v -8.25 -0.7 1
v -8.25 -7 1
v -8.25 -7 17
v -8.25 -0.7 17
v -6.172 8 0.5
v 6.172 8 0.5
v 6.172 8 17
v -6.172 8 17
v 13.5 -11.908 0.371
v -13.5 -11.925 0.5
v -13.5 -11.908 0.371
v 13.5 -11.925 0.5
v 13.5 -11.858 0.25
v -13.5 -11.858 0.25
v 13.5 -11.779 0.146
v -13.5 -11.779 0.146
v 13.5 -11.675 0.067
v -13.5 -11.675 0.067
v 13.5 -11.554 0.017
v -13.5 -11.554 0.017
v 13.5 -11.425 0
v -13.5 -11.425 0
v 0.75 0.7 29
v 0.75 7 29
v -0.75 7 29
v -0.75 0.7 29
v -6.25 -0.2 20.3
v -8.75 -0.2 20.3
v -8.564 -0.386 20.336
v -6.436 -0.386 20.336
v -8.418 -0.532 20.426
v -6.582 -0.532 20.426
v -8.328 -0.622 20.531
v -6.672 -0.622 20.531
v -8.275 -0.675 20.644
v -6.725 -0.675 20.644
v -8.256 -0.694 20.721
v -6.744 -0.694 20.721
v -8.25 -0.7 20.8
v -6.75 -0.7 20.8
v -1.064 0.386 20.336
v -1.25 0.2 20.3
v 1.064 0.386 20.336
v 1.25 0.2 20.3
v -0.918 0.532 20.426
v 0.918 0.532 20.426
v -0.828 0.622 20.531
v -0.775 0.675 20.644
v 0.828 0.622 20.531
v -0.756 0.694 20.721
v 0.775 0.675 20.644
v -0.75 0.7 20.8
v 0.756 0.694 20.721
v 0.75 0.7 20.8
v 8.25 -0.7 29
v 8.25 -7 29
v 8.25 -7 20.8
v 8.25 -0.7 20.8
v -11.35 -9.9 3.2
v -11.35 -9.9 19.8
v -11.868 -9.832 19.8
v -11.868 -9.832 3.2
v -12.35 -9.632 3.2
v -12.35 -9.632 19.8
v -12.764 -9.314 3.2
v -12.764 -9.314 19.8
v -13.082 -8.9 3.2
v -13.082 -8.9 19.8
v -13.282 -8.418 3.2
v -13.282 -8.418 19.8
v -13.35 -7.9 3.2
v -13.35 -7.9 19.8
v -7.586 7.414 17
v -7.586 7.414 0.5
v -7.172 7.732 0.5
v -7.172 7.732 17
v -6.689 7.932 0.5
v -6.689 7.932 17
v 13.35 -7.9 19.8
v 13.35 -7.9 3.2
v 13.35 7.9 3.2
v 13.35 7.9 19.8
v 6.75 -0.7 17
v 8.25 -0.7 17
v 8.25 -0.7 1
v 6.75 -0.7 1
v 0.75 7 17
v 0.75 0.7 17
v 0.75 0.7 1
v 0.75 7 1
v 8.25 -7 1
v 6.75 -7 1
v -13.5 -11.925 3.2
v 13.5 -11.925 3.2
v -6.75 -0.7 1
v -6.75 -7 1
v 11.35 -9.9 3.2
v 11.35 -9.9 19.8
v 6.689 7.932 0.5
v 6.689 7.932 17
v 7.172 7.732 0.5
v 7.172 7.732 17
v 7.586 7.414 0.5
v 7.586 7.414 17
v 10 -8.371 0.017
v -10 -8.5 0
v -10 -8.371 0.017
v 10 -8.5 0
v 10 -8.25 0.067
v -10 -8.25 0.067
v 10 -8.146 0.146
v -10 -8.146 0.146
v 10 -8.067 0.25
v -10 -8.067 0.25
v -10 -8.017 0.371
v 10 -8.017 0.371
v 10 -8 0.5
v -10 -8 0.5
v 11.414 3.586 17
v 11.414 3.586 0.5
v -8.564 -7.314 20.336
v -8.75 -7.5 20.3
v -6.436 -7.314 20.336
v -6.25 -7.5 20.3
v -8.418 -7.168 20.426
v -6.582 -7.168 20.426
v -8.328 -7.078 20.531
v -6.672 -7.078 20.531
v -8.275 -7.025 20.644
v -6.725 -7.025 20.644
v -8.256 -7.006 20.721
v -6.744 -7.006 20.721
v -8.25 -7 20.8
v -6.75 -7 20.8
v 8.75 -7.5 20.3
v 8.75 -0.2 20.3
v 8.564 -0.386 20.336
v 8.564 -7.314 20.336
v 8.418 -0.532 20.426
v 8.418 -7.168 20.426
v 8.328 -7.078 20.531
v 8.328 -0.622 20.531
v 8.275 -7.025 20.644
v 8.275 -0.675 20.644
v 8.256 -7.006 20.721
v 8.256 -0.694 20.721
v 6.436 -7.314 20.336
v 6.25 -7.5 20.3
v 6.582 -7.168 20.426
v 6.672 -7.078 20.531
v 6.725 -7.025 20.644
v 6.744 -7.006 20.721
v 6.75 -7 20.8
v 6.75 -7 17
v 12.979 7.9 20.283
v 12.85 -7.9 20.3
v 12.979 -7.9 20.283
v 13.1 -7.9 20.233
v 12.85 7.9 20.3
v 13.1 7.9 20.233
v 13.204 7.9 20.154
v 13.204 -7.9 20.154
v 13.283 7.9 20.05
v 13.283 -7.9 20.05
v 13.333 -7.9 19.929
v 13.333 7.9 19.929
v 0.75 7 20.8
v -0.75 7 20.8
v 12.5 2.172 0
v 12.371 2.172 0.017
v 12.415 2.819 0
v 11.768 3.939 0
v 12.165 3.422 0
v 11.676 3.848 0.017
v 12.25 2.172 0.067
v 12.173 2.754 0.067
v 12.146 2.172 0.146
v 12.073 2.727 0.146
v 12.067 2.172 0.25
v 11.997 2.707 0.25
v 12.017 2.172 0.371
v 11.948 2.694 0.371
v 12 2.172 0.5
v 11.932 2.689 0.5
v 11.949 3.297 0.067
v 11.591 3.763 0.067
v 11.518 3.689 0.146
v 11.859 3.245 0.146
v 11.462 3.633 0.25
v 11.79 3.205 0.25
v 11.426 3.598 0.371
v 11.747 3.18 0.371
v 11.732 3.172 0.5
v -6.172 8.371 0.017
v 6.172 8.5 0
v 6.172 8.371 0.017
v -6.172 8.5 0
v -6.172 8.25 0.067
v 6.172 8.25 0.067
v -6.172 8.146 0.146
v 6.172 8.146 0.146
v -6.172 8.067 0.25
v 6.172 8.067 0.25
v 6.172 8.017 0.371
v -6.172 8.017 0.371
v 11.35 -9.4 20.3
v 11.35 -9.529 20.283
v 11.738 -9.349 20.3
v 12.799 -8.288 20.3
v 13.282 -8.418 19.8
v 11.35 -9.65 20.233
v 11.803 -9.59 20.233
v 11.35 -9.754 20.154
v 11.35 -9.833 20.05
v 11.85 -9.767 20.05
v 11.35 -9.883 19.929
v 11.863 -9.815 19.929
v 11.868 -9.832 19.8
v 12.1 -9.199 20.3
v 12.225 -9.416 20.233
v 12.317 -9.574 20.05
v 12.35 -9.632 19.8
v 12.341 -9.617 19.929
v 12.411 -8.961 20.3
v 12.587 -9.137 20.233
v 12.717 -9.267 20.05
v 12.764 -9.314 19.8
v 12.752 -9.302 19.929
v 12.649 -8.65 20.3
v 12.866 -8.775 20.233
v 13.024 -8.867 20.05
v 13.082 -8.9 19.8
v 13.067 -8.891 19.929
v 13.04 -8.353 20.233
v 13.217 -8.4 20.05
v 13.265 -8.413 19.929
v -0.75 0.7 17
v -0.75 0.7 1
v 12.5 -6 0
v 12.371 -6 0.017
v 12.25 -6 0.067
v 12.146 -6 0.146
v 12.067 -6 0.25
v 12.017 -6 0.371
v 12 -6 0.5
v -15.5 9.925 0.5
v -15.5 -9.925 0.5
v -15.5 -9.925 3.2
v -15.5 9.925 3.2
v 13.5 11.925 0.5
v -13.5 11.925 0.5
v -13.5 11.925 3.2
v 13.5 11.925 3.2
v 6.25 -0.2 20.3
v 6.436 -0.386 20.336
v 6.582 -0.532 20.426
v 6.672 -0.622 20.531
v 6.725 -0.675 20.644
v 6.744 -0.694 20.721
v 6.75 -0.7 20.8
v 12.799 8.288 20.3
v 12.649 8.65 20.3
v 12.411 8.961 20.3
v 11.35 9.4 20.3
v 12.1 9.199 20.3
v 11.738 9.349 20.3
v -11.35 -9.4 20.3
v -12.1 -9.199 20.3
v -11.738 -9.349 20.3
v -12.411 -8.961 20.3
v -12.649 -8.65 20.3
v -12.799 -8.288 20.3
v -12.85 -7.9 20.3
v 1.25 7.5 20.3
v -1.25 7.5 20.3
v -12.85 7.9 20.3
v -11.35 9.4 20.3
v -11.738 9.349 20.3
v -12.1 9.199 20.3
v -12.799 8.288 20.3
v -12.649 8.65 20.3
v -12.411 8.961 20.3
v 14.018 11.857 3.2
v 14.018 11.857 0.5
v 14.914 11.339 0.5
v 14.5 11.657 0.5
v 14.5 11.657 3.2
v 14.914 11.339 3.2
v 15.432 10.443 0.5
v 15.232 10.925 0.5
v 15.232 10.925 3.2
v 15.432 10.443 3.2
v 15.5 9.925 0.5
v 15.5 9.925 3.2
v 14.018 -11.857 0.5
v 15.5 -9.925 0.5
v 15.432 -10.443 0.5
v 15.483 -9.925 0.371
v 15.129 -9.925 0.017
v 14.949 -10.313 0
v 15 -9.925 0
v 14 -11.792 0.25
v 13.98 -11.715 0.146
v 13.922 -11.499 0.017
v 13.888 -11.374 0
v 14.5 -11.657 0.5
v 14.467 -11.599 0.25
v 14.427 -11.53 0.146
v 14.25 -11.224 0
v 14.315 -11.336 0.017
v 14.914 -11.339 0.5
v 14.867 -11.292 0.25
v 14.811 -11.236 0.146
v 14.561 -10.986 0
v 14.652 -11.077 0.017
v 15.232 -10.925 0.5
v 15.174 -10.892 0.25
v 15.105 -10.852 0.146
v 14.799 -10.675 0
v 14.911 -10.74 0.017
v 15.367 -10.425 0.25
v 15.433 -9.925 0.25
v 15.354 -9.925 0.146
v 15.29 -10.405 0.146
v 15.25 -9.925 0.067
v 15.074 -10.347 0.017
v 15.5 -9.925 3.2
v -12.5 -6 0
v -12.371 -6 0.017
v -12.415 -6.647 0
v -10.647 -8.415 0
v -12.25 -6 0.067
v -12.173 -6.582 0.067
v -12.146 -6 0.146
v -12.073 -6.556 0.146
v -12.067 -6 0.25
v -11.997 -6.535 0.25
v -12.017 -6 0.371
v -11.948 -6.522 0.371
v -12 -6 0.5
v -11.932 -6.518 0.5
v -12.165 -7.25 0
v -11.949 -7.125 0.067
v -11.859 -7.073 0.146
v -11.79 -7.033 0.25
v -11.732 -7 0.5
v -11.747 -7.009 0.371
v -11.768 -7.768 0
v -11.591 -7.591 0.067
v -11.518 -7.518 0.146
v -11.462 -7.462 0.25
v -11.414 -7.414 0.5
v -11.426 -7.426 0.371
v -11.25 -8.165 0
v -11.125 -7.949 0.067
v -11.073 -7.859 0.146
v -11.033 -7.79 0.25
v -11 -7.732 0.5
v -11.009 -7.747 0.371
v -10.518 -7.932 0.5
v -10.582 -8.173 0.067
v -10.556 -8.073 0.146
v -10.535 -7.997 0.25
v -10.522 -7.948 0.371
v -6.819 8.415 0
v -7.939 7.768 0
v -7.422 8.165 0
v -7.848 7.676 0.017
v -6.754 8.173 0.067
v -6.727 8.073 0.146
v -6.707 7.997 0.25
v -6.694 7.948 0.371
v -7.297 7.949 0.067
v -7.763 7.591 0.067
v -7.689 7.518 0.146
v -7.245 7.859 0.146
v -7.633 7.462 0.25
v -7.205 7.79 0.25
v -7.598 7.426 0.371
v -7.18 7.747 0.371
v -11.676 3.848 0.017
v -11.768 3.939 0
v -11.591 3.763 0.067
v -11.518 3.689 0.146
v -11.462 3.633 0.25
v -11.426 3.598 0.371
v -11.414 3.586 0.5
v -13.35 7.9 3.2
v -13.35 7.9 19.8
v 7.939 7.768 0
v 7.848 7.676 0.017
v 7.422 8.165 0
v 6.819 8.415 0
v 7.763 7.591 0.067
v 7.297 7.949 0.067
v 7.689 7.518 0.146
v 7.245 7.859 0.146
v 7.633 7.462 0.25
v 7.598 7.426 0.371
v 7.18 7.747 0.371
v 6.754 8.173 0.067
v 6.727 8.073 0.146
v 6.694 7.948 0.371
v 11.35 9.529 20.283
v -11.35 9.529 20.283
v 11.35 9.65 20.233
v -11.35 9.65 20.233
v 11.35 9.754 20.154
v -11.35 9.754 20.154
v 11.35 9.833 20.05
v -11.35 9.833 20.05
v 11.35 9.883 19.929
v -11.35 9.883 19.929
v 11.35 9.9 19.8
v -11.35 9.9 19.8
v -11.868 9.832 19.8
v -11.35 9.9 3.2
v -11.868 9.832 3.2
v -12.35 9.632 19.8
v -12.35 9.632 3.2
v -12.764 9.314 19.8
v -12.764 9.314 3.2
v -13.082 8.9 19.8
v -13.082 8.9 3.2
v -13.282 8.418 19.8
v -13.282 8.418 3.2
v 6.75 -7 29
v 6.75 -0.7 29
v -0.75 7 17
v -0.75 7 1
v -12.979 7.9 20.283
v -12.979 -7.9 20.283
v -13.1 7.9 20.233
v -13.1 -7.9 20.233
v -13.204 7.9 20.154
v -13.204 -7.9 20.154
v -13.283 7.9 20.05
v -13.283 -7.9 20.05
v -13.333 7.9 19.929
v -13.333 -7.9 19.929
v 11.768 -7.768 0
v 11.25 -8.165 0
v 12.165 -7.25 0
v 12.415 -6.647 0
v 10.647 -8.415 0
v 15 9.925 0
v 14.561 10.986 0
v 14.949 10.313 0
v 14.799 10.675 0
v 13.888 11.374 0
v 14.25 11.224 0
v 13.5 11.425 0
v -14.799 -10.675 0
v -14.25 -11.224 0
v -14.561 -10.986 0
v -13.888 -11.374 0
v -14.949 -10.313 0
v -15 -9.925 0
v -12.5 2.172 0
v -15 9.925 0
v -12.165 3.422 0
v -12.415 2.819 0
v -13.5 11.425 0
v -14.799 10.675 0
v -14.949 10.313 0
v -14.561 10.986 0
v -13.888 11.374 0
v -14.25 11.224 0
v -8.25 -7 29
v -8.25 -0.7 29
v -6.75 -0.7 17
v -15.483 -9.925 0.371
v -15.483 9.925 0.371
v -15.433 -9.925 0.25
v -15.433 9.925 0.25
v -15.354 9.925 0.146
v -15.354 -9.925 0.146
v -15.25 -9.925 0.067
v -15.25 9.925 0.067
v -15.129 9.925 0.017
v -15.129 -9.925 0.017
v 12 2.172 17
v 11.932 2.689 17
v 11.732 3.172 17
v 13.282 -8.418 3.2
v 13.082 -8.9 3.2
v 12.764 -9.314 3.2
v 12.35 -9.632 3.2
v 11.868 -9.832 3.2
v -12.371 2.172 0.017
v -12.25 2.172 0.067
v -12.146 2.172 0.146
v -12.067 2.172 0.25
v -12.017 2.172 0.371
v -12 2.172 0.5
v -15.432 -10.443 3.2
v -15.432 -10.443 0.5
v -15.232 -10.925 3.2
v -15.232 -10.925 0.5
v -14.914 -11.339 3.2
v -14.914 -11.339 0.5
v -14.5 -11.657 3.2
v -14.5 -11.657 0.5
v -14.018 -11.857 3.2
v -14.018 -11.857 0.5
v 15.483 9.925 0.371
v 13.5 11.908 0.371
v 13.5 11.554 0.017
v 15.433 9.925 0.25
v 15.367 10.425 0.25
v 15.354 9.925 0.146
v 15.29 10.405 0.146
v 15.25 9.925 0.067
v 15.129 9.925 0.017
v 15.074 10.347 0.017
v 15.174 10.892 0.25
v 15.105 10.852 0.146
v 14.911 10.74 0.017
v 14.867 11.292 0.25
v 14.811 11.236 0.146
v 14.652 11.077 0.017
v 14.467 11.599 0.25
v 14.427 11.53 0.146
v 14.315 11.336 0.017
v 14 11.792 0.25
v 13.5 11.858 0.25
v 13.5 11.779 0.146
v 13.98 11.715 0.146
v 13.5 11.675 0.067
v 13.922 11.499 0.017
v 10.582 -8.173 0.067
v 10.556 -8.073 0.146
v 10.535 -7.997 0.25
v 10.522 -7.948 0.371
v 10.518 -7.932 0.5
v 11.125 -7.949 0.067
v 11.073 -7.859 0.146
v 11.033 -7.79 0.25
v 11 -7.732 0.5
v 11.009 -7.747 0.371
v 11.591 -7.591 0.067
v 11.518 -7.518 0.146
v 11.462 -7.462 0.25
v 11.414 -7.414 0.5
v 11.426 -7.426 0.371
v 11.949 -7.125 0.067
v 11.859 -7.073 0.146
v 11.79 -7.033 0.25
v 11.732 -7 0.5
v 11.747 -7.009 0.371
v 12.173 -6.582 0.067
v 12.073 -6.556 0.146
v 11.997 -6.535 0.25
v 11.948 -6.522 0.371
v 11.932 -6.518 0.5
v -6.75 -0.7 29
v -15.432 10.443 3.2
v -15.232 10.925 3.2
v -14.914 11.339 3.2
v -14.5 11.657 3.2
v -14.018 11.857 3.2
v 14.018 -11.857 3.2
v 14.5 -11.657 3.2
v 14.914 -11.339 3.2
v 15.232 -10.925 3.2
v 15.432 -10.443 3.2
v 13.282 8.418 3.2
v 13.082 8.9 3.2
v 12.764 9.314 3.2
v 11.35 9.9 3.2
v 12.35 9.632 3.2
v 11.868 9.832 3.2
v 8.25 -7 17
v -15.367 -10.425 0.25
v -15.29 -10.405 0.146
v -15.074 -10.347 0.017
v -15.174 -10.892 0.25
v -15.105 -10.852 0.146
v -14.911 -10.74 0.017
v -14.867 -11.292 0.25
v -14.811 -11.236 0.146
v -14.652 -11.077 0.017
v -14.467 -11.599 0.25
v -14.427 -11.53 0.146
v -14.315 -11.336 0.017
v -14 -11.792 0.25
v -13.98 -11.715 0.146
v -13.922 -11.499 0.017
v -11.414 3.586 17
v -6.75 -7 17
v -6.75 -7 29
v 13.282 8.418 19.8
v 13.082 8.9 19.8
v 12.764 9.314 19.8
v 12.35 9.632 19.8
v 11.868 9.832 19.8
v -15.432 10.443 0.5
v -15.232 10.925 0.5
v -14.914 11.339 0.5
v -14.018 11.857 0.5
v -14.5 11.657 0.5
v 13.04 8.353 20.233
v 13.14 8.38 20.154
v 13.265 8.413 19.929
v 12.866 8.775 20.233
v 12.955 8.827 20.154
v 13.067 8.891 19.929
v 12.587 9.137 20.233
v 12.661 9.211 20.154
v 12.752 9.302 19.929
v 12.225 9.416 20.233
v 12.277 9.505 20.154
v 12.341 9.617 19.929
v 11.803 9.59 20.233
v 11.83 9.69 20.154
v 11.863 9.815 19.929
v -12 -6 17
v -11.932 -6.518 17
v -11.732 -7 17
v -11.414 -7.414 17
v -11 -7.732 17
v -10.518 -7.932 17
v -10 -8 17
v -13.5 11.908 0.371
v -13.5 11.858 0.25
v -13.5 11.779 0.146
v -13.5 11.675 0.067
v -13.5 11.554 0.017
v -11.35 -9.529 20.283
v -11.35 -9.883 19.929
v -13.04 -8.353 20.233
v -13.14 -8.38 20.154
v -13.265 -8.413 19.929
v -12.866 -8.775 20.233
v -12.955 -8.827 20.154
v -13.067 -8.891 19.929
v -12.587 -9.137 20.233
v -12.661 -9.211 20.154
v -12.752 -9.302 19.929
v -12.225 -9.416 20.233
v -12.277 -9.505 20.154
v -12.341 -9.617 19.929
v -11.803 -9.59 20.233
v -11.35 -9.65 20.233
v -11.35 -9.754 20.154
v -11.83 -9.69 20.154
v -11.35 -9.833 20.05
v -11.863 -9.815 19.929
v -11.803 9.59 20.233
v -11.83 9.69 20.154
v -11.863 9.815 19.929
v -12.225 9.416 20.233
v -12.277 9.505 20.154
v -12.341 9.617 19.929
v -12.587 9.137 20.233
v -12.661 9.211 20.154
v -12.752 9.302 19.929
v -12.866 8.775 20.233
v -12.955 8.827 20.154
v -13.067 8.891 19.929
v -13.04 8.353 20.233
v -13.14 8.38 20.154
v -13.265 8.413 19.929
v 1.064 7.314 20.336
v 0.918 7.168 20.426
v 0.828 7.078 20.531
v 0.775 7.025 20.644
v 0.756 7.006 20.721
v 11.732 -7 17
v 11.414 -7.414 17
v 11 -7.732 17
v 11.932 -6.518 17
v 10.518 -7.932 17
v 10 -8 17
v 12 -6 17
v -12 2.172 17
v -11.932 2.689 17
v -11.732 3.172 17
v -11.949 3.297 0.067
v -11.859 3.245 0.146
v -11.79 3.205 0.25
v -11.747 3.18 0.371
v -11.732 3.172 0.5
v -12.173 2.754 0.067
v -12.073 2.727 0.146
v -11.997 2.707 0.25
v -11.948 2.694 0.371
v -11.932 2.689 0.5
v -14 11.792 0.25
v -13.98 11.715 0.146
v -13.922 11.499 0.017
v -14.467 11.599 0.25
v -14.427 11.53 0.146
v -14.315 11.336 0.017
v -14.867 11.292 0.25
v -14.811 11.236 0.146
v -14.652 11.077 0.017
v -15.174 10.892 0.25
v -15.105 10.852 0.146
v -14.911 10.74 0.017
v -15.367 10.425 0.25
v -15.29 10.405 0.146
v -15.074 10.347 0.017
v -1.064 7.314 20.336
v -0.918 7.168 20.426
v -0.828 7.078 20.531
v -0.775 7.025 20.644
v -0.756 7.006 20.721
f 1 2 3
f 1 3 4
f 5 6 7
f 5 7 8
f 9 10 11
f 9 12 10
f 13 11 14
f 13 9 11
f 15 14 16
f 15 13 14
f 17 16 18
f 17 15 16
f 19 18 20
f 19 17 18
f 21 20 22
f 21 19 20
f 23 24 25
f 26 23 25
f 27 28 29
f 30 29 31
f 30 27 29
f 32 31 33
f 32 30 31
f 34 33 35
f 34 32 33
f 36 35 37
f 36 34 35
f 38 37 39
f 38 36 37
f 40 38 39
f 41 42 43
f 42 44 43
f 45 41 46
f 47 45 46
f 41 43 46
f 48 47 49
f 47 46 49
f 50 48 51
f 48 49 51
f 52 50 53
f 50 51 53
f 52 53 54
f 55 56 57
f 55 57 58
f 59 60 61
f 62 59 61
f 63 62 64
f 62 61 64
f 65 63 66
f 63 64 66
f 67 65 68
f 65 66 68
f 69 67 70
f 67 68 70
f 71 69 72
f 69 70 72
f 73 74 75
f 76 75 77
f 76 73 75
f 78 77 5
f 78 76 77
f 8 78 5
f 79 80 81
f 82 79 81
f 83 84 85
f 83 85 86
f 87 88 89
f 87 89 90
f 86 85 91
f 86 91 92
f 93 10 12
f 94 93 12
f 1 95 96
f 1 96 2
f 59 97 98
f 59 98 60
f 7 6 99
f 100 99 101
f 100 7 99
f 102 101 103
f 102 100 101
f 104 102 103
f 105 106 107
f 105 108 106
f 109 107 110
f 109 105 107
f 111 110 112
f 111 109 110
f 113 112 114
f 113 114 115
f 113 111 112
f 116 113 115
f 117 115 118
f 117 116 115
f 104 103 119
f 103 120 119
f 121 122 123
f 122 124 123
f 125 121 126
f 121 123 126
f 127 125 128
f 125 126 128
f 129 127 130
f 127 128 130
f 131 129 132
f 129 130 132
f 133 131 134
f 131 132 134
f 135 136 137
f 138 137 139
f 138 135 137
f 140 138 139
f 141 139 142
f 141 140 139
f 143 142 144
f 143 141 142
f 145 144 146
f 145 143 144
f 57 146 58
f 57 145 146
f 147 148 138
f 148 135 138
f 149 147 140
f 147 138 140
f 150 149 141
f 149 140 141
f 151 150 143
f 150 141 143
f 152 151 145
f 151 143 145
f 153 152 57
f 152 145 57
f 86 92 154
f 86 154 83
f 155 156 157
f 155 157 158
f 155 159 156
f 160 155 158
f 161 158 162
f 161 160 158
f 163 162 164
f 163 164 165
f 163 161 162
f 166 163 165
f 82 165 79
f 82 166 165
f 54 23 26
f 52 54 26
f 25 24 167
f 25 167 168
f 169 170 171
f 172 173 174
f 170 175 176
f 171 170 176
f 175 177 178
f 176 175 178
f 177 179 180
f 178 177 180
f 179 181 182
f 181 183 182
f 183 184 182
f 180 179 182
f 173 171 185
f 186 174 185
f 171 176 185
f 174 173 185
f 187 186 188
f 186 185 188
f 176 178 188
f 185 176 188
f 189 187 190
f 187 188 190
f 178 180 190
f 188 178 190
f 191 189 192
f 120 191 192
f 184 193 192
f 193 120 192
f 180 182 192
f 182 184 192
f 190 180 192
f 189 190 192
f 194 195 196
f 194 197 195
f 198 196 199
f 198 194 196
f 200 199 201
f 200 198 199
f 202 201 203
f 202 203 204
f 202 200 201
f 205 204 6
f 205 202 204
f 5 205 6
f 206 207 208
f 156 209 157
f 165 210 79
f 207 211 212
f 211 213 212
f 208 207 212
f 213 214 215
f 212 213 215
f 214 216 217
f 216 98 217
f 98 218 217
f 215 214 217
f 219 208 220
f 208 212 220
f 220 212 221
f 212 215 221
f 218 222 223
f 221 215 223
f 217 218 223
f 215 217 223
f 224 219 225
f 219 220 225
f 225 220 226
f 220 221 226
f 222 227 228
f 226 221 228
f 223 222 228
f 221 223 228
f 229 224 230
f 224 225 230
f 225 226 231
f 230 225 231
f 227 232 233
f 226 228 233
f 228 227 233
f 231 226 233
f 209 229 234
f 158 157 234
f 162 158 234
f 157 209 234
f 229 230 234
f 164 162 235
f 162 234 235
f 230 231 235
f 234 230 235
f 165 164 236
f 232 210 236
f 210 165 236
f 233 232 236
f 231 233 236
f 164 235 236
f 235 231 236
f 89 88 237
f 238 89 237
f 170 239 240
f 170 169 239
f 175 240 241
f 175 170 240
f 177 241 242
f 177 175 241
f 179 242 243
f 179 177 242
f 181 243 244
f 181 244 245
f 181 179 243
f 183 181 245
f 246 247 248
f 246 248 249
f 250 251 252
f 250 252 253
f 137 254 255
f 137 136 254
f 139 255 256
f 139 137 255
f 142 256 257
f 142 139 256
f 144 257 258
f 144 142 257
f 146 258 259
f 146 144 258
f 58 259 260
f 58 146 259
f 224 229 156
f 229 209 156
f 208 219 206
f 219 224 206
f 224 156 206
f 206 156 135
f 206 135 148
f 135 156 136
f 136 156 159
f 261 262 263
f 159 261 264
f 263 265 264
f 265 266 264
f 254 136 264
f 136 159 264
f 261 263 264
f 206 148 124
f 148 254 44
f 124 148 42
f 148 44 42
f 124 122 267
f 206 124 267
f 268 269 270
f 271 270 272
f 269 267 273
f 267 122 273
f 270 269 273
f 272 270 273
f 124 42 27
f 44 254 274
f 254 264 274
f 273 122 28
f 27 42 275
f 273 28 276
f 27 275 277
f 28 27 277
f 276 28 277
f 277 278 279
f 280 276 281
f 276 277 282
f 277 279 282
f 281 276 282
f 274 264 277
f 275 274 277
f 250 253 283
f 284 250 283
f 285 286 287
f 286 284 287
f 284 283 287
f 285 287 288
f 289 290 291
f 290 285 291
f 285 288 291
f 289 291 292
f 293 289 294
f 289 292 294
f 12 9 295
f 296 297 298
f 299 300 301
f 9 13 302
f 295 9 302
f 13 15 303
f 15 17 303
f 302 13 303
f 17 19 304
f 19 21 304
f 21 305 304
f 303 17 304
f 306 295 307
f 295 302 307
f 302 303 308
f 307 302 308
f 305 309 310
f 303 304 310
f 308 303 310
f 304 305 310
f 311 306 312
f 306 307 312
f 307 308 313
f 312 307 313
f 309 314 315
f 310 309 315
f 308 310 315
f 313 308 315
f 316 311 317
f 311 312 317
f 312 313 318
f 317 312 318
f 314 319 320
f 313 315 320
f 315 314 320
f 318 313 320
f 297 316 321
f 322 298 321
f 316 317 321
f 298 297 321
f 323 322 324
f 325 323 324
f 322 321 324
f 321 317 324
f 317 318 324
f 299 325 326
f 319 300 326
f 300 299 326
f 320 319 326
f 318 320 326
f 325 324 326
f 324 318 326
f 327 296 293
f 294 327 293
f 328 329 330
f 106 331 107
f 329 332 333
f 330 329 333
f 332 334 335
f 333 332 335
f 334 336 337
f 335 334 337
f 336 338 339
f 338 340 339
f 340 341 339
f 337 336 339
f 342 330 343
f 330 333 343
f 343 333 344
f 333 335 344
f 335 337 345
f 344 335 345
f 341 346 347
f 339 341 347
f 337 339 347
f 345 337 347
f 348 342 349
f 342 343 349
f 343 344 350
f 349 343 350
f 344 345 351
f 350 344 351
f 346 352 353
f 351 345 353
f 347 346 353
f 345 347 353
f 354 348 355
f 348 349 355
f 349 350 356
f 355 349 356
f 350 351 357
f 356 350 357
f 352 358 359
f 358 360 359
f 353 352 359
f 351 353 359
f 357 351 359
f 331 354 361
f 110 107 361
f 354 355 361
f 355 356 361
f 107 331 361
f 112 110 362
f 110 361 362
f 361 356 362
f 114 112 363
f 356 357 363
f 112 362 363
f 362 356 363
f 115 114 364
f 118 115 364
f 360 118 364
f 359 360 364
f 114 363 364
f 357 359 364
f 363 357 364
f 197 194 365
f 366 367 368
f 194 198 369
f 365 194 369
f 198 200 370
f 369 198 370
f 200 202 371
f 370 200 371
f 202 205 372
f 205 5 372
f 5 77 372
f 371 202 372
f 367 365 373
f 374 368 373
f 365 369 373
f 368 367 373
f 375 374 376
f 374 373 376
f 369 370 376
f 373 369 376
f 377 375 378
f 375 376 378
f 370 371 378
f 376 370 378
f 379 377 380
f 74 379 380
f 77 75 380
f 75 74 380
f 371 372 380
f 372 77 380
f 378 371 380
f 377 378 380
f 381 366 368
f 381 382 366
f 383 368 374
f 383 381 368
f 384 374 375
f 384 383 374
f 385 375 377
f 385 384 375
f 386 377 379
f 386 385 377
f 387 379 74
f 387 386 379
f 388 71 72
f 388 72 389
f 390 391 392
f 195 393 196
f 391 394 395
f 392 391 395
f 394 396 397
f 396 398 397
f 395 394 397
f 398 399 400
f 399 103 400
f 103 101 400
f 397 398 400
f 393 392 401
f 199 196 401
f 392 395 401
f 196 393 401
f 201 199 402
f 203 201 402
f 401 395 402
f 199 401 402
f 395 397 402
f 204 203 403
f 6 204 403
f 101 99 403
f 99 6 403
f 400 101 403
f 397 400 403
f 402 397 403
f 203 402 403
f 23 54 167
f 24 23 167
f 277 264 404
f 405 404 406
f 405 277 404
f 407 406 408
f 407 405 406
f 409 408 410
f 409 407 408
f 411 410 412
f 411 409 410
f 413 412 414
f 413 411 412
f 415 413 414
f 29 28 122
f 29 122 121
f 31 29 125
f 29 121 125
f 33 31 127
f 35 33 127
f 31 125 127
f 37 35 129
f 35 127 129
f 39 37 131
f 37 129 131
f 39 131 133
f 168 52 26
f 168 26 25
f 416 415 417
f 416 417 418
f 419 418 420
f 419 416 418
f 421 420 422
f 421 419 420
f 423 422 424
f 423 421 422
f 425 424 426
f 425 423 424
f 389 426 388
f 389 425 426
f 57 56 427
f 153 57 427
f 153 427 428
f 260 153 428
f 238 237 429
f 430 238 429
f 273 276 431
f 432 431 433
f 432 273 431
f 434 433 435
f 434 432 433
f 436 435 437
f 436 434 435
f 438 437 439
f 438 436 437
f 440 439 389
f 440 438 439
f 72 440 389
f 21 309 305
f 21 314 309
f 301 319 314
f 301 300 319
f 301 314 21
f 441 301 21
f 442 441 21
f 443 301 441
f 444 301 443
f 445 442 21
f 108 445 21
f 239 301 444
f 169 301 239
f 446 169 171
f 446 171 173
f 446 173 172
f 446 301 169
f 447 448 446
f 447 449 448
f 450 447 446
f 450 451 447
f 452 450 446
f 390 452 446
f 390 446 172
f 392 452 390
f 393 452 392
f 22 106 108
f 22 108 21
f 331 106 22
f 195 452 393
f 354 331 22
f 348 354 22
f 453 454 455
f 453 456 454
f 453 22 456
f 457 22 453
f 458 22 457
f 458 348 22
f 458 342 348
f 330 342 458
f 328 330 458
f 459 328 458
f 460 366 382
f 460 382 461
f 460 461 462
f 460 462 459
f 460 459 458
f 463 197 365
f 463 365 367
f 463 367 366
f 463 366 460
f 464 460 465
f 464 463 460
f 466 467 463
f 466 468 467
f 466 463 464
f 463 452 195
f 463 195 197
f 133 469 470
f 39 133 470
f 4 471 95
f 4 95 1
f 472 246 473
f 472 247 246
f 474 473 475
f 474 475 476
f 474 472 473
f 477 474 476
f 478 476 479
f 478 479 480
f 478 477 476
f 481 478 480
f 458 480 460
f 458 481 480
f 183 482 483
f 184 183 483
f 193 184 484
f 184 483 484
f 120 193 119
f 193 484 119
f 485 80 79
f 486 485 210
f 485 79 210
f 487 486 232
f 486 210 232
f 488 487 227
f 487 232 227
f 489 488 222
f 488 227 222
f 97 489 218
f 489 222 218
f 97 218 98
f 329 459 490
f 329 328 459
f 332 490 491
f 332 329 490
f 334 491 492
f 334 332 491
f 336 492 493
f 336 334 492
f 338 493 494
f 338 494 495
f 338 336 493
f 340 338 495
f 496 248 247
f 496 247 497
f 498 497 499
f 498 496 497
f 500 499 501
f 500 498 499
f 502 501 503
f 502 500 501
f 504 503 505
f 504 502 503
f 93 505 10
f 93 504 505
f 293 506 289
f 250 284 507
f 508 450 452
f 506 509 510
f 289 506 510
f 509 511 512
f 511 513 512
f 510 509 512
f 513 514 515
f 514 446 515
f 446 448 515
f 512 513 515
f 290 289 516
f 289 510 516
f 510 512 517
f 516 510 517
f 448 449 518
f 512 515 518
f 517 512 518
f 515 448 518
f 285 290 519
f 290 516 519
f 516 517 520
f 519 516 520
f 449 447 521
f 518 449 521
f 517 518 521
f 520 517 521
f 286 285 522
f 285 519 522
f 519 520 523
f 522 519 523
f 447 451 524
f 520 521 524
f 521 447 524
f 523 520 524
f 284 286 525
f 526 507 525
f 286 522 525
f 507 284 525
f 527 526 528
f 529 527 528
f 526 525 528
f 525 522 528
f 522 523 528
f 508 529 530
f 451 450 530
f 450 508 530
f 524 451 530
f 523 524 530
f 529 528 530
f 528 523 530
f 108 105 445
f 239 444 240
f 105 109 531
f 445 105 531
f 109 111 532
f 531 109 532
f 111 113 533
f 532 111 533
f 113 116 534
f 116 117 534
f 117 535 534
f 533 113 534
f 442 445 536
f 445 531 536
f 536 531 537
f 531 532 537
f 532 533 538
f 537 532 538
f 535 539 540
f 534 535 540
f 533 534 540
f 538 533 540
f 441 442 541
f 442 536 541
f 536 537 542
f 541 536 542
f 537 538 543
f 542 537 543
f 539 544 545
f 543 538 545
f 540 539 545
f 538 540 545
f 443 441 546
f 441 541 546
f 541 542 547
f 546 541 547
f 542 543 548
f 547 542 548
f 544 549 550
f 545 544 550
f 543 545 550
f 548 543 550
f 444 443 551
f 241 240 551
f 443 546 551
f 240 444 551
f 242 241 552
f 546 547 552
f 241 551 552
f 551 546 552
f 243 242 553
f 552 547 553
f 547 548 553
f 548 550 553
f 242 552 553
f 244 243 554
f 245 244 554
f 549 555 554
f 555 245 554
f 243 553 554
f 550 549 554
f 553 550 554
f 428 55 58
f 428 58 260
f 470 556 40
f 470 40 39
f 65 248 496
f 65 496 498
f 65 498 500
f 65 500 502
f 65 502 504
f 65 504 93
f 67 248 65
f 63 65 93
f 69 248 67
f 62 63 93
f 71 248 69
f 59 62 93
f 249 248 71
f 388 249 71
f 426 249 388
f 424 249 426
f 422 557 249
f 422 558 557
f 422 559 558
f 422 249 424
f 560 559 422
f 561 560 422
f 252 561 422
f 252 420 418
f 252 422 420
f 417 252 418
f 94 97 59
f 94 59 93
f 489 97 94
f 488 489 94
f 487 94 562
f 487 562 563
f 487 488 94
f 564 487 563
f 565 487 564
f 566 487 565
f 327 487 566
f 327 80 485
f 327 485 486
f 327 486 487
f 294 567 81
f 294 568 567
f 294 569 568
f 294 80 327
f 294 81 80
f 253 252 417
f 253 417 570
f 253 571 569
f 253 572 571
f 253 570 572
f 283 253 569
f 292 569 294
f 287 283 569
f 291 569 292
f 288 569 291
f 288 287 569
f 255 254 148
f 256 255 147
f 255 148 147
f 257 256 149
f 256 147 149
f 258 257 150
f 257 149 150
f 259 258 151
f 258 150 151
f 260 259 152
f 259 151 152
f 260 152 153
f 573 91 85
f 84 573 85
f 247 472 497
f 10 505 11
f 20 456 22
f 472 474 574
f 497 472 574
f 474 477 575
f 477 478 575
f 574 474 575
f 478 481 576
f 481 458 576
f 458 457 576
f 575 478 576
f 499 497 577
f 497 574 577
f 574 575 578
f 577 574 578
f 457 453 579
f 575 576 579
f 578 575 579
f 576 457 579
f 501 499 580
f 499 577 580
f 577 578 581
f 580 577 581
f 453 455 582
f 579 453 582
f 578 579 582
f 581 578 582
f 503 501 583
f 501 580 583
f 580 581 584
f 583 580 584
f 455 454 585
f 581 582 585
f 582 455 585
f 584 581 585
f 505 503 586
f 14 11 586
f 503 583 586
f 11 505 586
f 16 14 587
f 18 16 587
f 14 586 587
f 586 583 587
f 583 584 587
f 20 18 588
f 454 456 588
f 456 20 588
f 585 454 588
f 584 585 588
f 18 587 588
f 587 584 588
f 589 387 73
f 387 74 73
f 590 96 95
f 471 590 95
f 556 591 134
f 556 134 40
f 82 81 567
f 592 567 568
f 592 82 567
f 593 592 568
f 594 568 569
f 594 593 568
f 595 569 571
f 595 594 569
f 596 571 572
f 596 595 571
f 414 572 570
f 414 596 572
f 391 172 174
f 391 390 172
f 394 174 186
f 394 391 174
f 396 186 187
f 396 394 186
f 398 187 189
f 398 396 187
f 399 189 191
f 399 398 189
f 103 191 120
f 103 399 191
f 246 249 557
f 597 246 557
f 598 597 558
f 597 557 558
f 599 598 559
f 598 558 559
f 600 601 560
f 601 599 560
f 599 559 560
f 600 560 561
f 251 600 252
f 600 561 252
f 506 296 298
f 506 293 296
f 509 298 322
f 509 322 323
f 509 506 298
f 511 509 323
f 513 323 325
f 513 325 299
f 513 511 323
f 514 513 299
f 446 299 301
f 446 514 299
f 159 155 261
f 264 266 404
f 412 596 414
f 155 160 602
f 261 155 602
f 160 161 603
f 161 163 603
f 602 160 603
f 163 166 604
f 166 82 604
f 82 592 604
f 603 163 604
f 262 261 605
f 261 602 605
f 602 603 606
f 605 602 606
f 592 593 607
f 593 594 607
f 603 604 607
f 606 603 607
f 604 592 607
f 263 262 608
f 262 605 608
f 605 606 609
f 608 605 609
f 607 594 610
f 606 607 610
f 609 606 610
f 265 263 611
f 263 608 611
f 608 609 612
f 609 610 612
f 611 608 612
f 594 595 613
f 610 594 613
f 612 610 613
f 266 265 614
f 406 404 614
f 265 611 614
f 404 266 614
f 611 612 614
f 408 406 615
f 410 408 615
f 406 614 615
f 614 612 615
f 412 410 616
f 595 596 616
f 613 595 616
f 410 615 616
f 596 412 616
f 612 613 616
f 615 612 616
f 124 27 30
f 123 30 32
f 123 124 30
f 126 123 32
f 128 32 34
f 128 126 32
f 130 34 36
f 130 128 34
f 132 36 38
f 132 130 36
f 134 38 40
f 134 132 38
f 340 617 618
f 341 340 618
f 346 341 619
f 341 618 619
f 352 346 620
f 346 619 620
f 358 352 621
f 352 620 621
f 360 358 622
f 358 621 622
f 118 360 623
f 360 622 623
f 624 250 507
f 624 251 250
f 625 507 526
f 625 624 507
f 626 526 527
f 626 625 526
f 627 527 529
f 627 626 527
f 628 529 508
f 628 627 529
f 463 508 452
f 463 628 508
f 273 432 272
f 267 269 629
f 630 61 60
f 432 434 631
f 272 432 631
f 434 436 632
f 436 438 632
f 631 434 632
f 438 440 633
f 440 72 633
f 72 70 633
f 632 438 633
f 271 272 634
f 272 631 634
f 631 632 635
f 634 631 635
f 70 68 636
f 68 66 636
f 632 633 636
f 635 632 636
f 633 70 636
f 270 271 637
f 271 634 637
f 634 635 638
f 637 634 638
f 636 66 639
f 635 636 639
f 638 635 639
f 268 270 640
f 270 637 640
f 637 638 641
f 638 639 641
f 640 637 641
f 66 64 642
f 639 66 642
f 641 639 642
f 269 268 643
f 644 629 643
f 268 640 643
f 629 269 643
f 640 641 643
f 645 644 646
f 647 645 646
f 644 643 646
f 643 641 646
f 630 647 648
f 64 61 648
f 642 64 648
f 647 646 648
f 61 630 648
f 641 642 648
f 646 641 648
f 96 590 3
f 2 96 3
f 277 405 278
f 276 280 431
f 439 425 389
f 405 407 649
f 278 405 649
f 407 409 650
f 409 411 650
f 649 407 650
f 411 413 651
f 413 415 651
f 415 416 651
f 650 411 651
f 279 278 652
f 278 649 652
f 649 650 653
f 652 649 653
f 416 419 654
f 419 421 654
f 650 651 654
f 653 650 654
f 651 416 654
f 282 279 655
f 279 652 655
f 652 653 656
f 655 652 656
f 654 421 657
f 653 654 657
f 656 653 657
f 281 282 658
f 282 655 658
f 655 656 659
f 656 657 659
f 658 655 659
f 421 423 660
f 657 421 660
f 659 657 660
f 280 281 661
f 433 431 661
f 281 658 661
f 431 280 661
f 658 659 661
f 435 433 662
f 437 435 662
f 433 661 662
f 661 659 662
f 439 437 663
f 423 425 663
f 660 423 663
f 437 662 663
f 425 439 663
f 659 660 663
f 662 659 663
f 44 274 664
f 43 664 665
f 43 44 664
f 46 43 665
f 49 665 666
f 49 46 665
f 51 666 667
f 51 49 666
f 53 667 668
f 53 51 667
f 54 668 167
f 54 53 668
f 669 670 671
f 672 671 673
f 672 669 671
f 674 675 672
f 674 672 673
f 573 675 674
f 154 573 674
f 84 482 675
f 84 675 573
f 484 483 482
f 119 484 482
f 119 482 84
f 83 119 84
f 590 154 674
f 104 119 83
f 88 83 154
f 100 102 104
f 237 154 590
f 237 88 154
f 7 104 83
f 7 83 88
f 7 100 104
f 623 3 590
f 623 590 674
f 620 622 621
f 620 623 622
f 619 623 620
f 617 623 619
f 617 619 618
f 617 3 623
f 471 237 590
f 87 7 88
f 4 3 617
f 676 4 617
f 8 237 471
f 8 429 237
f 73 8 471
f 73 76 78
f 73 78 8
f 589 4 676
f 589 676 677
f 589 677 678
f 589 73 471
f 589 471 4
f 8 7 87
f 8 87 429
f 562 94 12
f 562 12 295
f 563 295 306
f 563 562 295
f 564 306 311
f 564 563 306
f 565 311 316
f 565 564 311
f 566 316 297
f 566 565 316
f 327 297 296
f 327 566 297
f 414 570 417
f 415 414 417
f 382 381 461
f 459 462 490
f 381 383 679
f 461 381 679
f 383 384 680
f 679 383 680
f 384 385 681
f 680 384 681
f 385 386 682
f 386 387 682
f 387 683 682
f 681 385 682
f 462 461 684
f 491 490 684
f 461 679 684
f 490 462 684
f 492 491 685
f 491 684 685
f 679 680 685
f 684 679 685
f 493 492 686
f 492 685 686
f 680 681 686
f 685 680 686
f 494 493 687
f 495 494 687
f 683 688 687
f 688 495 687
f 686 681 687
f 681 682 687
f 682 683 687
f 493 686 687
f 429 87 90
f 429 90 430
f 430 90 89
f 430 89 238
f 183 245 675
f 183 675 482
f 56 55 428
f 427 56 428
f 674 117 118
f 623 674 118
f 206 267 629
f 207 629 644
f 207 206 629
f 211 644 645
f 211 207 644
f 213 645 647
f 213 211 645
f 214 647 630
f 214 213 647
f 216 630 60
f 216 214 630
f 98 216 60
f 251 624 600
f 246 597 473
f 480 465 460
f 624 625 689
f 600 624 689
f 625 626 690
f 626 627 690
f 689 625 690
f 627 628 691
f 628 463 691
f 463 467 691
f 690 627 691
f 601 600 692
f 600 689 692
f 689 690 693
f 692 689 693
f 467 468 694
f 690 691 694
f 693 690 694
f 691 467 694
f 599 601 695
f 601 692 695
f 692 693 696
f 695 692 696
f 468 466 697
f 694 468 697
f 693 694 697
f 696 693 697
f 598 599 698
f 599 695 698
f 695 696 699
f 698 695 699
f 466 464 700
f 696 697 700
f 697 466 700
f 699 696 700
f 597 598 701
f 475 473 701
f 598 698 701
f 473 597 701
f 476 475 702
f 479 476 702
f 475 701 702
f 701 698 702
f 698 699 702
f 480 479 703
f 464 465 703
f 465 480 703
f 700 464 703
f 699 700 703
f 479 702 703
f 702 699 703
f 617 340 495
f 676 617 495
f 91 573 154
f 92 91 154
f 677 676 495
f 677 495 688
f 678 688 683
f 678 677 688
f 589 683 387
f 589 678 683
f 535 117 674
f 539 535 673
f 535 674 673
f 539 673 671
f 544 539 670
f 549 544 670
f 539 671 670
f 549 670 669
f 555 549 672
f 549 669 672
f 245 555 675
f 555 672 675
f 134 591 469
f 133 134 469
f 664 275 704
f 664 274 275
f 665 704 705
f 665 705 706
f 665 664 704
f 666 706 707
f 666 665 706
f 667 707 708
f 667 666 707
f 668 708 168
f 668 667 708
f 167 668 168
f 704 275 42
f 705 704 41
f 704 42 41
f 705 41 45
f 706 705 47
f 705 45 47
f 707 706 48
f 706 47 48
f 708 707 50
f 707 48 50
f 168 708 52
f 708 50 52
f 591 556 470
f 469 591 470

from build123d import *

# Parameters (mm, degrees)
ESQUISSE1_W             = 31
ESQUISSE1_H             = 23.85
BOSS_EXTRU_1_DEPTH      = 3.2
ESQUISSE2_W             = 26.7
ESQUISSE2_H             = 19.8
BOSS_EXTRU_2_DEPTH      = 20.3
ESQUISSE3_W             = 24
ESQUISSE3_H             = 16
ENL_V_MAT_EXTRU_1_DEPTH = 17
CHANFREIN1_SIZE         = 5
BOSS_EXTRU_3_DEPTH      = 16
BOSS_EXTRU_3_DEPTH_BACK = 12
ESQUISSE4_W             = 1.5
ESQUISSE4_H             = 6.3
CONG_1_R                = 2
CONG_2_R                = 0.5


with BuildPart() as part:
    # Esquisse1 → Boss.-Extru.1 (new body)
    with BuildSketch(Plane.XY):
        Rectangle(ESQUISSE1_W, ESQUISSE1_H)
    extrude(amount=BOSS_EXTRU_1_DEPTH)

    # Esquisse2 → Boss.-Extru.2 (add)
    with BuildSketch(Plane(origin=(0, 0, 0), x_dir=(-1, 0, 0), z_dir=(0, 0, -1))):
        Rectangle(ESQUISSE2_W, ESQUISSE2_H)
    extrude(amount=-BOSS_EXTRU_2_DEPTH)

    # Esquisse3 → Enlèv. mat.-Extru.1 (cut)
    with BuildSketch(Plane(origin=(0, 0, 0), x_dir=(-1, 0, 0), z_dir=(0, 0, -1))):
        Rectangle(ESQUISSE3_W, ESQUISSE3_H)
    extrude(amount=-ENL_V_MAT_EXTRU_1_DEPTH, mode=Mode.SUBTRACT)

    # Chanfrein1
    chanfrein1_edges = [part.edges().sort_by_distance(p)[0] for p in [
        (-12, 8, 8.5),
        (12, 8, 8.5),
    ]]
    chamfer(chanfrein1_edges, length=CHANFREIN1_SIZE)

    # Esquisse4 → Boss.-Extru.3 (add, two sides: drawn at the far end of the back side and taken through both)
    with BuildSketch(Plane(origin=(0, 0, 17), x_dir=(-1, 0, 0), z_dir=(0, 0, -1)).offset(-BOSS_EXTRU_3_DEPTH_BACK)):
        with Locations((0, 3.85)):
            Rectangle(ESQUISSE4_W, ESQUISSE4_H)
        with Locations((-7.5, -3.85)):
            Rectangle(ESQUISSE4_W, ESQUISSE4_H)
        with Locations((7.5, -3.85)):
            Rectangle(ESQUISSE4_W, ESQUISSE4_H)
    extrude(amount=BOSS_EXTRU_3_DEPTH + BOSS_EXTRU_3_DEPTH_BACK)

    # Congé1
    cong_1_edges = [part.edges().sort_by_distance(p)[0] for p in [
        (-13.35, 9.9, 11.75),
        (-13.35, -9.9, 11.75),
        (13.35, -9.9, 11.75),
        (13.35, 9.9, 11.75),
        (-12, -8, 8.5),
        (12, -8, 8.5),
        (12, 3, 8.5),
        (-7, 8, 8.5),
        (7, 8, 8.5),
        (-12, 3, 8.5),
        (15.5, -11.925, 1.6),
        (-15.5, -11.925, 1.6),
        (-15.5, 11.925, 1.6),
        (15.5, 11.925, 1.6),
    ]]
    fillet(cong_1_edges, radius=CONG_1_R)

    # Congé2
    cong_2_edges = [part.edges().sort_by_distance(p)[0] for p in [
        (-6.75, -3.85, 20.3),
        (-7.5, -7, 20.3),
        (-8.25, -3.85, 20.3),
        (15.5, 0, 0),
        (0, 8, 0),
        (-9.5, 5.5, 0),
        (-12, -1.914213562, 0),
        (0, -8, 0),
        (12, -1.914213562, 0),
        (9.5, 5.5, 0),
        (0, -11.925, 0),
        (-15.5, 0, 0),
        (0, 11.925, 0),
        (14.914213562, 11.339213562, 0),
        (-14.914213562, 11.339213562, 0),
        (-14.914213562, -11.339213562, 0),
        (14.914213562, -11.339213562, 0),
        (13.35, 0, 20.3),
        (0, -9.9, 20.3),
        (-13.35, 0, 20.3),
        (0, 9.9, 20.3),
        (12.764213562, 9.314213562, 20.3),
        (-12.764213562, 9.314213562, 20.3),
        (-12.764213562, -9.314213562, 20.3),
        (12.764213562, -9.314213562, 20.3),
        (-11.414213562, -7.414213562, 0),
        (-11.847759065, 2.93693974, 0),
        (-6.93693974, 7.847759065, 0),
        (6.93693974, 7.847759065, 0),
        (11.414213562, -7.414213562, 0),
        (11.847759065, 2.93693974, 0),
        (0, 7, 20.3),
        (0.75, 3.85, 20.3),
        (0, 0.7, 20.3),
        (-0.75, 3.85, 20.3),
        (7.5, -0.7, 20.3),
        (8.25, -3.85, 20.3),
        (7.5, -7, 20.3),
        (6.75, -3.85, 20.3),
        (-7.5, -0.7, 20.3),
    ]]
    fillet(cong_2_edges, radius=CONG_2_R)


solid = part.part
